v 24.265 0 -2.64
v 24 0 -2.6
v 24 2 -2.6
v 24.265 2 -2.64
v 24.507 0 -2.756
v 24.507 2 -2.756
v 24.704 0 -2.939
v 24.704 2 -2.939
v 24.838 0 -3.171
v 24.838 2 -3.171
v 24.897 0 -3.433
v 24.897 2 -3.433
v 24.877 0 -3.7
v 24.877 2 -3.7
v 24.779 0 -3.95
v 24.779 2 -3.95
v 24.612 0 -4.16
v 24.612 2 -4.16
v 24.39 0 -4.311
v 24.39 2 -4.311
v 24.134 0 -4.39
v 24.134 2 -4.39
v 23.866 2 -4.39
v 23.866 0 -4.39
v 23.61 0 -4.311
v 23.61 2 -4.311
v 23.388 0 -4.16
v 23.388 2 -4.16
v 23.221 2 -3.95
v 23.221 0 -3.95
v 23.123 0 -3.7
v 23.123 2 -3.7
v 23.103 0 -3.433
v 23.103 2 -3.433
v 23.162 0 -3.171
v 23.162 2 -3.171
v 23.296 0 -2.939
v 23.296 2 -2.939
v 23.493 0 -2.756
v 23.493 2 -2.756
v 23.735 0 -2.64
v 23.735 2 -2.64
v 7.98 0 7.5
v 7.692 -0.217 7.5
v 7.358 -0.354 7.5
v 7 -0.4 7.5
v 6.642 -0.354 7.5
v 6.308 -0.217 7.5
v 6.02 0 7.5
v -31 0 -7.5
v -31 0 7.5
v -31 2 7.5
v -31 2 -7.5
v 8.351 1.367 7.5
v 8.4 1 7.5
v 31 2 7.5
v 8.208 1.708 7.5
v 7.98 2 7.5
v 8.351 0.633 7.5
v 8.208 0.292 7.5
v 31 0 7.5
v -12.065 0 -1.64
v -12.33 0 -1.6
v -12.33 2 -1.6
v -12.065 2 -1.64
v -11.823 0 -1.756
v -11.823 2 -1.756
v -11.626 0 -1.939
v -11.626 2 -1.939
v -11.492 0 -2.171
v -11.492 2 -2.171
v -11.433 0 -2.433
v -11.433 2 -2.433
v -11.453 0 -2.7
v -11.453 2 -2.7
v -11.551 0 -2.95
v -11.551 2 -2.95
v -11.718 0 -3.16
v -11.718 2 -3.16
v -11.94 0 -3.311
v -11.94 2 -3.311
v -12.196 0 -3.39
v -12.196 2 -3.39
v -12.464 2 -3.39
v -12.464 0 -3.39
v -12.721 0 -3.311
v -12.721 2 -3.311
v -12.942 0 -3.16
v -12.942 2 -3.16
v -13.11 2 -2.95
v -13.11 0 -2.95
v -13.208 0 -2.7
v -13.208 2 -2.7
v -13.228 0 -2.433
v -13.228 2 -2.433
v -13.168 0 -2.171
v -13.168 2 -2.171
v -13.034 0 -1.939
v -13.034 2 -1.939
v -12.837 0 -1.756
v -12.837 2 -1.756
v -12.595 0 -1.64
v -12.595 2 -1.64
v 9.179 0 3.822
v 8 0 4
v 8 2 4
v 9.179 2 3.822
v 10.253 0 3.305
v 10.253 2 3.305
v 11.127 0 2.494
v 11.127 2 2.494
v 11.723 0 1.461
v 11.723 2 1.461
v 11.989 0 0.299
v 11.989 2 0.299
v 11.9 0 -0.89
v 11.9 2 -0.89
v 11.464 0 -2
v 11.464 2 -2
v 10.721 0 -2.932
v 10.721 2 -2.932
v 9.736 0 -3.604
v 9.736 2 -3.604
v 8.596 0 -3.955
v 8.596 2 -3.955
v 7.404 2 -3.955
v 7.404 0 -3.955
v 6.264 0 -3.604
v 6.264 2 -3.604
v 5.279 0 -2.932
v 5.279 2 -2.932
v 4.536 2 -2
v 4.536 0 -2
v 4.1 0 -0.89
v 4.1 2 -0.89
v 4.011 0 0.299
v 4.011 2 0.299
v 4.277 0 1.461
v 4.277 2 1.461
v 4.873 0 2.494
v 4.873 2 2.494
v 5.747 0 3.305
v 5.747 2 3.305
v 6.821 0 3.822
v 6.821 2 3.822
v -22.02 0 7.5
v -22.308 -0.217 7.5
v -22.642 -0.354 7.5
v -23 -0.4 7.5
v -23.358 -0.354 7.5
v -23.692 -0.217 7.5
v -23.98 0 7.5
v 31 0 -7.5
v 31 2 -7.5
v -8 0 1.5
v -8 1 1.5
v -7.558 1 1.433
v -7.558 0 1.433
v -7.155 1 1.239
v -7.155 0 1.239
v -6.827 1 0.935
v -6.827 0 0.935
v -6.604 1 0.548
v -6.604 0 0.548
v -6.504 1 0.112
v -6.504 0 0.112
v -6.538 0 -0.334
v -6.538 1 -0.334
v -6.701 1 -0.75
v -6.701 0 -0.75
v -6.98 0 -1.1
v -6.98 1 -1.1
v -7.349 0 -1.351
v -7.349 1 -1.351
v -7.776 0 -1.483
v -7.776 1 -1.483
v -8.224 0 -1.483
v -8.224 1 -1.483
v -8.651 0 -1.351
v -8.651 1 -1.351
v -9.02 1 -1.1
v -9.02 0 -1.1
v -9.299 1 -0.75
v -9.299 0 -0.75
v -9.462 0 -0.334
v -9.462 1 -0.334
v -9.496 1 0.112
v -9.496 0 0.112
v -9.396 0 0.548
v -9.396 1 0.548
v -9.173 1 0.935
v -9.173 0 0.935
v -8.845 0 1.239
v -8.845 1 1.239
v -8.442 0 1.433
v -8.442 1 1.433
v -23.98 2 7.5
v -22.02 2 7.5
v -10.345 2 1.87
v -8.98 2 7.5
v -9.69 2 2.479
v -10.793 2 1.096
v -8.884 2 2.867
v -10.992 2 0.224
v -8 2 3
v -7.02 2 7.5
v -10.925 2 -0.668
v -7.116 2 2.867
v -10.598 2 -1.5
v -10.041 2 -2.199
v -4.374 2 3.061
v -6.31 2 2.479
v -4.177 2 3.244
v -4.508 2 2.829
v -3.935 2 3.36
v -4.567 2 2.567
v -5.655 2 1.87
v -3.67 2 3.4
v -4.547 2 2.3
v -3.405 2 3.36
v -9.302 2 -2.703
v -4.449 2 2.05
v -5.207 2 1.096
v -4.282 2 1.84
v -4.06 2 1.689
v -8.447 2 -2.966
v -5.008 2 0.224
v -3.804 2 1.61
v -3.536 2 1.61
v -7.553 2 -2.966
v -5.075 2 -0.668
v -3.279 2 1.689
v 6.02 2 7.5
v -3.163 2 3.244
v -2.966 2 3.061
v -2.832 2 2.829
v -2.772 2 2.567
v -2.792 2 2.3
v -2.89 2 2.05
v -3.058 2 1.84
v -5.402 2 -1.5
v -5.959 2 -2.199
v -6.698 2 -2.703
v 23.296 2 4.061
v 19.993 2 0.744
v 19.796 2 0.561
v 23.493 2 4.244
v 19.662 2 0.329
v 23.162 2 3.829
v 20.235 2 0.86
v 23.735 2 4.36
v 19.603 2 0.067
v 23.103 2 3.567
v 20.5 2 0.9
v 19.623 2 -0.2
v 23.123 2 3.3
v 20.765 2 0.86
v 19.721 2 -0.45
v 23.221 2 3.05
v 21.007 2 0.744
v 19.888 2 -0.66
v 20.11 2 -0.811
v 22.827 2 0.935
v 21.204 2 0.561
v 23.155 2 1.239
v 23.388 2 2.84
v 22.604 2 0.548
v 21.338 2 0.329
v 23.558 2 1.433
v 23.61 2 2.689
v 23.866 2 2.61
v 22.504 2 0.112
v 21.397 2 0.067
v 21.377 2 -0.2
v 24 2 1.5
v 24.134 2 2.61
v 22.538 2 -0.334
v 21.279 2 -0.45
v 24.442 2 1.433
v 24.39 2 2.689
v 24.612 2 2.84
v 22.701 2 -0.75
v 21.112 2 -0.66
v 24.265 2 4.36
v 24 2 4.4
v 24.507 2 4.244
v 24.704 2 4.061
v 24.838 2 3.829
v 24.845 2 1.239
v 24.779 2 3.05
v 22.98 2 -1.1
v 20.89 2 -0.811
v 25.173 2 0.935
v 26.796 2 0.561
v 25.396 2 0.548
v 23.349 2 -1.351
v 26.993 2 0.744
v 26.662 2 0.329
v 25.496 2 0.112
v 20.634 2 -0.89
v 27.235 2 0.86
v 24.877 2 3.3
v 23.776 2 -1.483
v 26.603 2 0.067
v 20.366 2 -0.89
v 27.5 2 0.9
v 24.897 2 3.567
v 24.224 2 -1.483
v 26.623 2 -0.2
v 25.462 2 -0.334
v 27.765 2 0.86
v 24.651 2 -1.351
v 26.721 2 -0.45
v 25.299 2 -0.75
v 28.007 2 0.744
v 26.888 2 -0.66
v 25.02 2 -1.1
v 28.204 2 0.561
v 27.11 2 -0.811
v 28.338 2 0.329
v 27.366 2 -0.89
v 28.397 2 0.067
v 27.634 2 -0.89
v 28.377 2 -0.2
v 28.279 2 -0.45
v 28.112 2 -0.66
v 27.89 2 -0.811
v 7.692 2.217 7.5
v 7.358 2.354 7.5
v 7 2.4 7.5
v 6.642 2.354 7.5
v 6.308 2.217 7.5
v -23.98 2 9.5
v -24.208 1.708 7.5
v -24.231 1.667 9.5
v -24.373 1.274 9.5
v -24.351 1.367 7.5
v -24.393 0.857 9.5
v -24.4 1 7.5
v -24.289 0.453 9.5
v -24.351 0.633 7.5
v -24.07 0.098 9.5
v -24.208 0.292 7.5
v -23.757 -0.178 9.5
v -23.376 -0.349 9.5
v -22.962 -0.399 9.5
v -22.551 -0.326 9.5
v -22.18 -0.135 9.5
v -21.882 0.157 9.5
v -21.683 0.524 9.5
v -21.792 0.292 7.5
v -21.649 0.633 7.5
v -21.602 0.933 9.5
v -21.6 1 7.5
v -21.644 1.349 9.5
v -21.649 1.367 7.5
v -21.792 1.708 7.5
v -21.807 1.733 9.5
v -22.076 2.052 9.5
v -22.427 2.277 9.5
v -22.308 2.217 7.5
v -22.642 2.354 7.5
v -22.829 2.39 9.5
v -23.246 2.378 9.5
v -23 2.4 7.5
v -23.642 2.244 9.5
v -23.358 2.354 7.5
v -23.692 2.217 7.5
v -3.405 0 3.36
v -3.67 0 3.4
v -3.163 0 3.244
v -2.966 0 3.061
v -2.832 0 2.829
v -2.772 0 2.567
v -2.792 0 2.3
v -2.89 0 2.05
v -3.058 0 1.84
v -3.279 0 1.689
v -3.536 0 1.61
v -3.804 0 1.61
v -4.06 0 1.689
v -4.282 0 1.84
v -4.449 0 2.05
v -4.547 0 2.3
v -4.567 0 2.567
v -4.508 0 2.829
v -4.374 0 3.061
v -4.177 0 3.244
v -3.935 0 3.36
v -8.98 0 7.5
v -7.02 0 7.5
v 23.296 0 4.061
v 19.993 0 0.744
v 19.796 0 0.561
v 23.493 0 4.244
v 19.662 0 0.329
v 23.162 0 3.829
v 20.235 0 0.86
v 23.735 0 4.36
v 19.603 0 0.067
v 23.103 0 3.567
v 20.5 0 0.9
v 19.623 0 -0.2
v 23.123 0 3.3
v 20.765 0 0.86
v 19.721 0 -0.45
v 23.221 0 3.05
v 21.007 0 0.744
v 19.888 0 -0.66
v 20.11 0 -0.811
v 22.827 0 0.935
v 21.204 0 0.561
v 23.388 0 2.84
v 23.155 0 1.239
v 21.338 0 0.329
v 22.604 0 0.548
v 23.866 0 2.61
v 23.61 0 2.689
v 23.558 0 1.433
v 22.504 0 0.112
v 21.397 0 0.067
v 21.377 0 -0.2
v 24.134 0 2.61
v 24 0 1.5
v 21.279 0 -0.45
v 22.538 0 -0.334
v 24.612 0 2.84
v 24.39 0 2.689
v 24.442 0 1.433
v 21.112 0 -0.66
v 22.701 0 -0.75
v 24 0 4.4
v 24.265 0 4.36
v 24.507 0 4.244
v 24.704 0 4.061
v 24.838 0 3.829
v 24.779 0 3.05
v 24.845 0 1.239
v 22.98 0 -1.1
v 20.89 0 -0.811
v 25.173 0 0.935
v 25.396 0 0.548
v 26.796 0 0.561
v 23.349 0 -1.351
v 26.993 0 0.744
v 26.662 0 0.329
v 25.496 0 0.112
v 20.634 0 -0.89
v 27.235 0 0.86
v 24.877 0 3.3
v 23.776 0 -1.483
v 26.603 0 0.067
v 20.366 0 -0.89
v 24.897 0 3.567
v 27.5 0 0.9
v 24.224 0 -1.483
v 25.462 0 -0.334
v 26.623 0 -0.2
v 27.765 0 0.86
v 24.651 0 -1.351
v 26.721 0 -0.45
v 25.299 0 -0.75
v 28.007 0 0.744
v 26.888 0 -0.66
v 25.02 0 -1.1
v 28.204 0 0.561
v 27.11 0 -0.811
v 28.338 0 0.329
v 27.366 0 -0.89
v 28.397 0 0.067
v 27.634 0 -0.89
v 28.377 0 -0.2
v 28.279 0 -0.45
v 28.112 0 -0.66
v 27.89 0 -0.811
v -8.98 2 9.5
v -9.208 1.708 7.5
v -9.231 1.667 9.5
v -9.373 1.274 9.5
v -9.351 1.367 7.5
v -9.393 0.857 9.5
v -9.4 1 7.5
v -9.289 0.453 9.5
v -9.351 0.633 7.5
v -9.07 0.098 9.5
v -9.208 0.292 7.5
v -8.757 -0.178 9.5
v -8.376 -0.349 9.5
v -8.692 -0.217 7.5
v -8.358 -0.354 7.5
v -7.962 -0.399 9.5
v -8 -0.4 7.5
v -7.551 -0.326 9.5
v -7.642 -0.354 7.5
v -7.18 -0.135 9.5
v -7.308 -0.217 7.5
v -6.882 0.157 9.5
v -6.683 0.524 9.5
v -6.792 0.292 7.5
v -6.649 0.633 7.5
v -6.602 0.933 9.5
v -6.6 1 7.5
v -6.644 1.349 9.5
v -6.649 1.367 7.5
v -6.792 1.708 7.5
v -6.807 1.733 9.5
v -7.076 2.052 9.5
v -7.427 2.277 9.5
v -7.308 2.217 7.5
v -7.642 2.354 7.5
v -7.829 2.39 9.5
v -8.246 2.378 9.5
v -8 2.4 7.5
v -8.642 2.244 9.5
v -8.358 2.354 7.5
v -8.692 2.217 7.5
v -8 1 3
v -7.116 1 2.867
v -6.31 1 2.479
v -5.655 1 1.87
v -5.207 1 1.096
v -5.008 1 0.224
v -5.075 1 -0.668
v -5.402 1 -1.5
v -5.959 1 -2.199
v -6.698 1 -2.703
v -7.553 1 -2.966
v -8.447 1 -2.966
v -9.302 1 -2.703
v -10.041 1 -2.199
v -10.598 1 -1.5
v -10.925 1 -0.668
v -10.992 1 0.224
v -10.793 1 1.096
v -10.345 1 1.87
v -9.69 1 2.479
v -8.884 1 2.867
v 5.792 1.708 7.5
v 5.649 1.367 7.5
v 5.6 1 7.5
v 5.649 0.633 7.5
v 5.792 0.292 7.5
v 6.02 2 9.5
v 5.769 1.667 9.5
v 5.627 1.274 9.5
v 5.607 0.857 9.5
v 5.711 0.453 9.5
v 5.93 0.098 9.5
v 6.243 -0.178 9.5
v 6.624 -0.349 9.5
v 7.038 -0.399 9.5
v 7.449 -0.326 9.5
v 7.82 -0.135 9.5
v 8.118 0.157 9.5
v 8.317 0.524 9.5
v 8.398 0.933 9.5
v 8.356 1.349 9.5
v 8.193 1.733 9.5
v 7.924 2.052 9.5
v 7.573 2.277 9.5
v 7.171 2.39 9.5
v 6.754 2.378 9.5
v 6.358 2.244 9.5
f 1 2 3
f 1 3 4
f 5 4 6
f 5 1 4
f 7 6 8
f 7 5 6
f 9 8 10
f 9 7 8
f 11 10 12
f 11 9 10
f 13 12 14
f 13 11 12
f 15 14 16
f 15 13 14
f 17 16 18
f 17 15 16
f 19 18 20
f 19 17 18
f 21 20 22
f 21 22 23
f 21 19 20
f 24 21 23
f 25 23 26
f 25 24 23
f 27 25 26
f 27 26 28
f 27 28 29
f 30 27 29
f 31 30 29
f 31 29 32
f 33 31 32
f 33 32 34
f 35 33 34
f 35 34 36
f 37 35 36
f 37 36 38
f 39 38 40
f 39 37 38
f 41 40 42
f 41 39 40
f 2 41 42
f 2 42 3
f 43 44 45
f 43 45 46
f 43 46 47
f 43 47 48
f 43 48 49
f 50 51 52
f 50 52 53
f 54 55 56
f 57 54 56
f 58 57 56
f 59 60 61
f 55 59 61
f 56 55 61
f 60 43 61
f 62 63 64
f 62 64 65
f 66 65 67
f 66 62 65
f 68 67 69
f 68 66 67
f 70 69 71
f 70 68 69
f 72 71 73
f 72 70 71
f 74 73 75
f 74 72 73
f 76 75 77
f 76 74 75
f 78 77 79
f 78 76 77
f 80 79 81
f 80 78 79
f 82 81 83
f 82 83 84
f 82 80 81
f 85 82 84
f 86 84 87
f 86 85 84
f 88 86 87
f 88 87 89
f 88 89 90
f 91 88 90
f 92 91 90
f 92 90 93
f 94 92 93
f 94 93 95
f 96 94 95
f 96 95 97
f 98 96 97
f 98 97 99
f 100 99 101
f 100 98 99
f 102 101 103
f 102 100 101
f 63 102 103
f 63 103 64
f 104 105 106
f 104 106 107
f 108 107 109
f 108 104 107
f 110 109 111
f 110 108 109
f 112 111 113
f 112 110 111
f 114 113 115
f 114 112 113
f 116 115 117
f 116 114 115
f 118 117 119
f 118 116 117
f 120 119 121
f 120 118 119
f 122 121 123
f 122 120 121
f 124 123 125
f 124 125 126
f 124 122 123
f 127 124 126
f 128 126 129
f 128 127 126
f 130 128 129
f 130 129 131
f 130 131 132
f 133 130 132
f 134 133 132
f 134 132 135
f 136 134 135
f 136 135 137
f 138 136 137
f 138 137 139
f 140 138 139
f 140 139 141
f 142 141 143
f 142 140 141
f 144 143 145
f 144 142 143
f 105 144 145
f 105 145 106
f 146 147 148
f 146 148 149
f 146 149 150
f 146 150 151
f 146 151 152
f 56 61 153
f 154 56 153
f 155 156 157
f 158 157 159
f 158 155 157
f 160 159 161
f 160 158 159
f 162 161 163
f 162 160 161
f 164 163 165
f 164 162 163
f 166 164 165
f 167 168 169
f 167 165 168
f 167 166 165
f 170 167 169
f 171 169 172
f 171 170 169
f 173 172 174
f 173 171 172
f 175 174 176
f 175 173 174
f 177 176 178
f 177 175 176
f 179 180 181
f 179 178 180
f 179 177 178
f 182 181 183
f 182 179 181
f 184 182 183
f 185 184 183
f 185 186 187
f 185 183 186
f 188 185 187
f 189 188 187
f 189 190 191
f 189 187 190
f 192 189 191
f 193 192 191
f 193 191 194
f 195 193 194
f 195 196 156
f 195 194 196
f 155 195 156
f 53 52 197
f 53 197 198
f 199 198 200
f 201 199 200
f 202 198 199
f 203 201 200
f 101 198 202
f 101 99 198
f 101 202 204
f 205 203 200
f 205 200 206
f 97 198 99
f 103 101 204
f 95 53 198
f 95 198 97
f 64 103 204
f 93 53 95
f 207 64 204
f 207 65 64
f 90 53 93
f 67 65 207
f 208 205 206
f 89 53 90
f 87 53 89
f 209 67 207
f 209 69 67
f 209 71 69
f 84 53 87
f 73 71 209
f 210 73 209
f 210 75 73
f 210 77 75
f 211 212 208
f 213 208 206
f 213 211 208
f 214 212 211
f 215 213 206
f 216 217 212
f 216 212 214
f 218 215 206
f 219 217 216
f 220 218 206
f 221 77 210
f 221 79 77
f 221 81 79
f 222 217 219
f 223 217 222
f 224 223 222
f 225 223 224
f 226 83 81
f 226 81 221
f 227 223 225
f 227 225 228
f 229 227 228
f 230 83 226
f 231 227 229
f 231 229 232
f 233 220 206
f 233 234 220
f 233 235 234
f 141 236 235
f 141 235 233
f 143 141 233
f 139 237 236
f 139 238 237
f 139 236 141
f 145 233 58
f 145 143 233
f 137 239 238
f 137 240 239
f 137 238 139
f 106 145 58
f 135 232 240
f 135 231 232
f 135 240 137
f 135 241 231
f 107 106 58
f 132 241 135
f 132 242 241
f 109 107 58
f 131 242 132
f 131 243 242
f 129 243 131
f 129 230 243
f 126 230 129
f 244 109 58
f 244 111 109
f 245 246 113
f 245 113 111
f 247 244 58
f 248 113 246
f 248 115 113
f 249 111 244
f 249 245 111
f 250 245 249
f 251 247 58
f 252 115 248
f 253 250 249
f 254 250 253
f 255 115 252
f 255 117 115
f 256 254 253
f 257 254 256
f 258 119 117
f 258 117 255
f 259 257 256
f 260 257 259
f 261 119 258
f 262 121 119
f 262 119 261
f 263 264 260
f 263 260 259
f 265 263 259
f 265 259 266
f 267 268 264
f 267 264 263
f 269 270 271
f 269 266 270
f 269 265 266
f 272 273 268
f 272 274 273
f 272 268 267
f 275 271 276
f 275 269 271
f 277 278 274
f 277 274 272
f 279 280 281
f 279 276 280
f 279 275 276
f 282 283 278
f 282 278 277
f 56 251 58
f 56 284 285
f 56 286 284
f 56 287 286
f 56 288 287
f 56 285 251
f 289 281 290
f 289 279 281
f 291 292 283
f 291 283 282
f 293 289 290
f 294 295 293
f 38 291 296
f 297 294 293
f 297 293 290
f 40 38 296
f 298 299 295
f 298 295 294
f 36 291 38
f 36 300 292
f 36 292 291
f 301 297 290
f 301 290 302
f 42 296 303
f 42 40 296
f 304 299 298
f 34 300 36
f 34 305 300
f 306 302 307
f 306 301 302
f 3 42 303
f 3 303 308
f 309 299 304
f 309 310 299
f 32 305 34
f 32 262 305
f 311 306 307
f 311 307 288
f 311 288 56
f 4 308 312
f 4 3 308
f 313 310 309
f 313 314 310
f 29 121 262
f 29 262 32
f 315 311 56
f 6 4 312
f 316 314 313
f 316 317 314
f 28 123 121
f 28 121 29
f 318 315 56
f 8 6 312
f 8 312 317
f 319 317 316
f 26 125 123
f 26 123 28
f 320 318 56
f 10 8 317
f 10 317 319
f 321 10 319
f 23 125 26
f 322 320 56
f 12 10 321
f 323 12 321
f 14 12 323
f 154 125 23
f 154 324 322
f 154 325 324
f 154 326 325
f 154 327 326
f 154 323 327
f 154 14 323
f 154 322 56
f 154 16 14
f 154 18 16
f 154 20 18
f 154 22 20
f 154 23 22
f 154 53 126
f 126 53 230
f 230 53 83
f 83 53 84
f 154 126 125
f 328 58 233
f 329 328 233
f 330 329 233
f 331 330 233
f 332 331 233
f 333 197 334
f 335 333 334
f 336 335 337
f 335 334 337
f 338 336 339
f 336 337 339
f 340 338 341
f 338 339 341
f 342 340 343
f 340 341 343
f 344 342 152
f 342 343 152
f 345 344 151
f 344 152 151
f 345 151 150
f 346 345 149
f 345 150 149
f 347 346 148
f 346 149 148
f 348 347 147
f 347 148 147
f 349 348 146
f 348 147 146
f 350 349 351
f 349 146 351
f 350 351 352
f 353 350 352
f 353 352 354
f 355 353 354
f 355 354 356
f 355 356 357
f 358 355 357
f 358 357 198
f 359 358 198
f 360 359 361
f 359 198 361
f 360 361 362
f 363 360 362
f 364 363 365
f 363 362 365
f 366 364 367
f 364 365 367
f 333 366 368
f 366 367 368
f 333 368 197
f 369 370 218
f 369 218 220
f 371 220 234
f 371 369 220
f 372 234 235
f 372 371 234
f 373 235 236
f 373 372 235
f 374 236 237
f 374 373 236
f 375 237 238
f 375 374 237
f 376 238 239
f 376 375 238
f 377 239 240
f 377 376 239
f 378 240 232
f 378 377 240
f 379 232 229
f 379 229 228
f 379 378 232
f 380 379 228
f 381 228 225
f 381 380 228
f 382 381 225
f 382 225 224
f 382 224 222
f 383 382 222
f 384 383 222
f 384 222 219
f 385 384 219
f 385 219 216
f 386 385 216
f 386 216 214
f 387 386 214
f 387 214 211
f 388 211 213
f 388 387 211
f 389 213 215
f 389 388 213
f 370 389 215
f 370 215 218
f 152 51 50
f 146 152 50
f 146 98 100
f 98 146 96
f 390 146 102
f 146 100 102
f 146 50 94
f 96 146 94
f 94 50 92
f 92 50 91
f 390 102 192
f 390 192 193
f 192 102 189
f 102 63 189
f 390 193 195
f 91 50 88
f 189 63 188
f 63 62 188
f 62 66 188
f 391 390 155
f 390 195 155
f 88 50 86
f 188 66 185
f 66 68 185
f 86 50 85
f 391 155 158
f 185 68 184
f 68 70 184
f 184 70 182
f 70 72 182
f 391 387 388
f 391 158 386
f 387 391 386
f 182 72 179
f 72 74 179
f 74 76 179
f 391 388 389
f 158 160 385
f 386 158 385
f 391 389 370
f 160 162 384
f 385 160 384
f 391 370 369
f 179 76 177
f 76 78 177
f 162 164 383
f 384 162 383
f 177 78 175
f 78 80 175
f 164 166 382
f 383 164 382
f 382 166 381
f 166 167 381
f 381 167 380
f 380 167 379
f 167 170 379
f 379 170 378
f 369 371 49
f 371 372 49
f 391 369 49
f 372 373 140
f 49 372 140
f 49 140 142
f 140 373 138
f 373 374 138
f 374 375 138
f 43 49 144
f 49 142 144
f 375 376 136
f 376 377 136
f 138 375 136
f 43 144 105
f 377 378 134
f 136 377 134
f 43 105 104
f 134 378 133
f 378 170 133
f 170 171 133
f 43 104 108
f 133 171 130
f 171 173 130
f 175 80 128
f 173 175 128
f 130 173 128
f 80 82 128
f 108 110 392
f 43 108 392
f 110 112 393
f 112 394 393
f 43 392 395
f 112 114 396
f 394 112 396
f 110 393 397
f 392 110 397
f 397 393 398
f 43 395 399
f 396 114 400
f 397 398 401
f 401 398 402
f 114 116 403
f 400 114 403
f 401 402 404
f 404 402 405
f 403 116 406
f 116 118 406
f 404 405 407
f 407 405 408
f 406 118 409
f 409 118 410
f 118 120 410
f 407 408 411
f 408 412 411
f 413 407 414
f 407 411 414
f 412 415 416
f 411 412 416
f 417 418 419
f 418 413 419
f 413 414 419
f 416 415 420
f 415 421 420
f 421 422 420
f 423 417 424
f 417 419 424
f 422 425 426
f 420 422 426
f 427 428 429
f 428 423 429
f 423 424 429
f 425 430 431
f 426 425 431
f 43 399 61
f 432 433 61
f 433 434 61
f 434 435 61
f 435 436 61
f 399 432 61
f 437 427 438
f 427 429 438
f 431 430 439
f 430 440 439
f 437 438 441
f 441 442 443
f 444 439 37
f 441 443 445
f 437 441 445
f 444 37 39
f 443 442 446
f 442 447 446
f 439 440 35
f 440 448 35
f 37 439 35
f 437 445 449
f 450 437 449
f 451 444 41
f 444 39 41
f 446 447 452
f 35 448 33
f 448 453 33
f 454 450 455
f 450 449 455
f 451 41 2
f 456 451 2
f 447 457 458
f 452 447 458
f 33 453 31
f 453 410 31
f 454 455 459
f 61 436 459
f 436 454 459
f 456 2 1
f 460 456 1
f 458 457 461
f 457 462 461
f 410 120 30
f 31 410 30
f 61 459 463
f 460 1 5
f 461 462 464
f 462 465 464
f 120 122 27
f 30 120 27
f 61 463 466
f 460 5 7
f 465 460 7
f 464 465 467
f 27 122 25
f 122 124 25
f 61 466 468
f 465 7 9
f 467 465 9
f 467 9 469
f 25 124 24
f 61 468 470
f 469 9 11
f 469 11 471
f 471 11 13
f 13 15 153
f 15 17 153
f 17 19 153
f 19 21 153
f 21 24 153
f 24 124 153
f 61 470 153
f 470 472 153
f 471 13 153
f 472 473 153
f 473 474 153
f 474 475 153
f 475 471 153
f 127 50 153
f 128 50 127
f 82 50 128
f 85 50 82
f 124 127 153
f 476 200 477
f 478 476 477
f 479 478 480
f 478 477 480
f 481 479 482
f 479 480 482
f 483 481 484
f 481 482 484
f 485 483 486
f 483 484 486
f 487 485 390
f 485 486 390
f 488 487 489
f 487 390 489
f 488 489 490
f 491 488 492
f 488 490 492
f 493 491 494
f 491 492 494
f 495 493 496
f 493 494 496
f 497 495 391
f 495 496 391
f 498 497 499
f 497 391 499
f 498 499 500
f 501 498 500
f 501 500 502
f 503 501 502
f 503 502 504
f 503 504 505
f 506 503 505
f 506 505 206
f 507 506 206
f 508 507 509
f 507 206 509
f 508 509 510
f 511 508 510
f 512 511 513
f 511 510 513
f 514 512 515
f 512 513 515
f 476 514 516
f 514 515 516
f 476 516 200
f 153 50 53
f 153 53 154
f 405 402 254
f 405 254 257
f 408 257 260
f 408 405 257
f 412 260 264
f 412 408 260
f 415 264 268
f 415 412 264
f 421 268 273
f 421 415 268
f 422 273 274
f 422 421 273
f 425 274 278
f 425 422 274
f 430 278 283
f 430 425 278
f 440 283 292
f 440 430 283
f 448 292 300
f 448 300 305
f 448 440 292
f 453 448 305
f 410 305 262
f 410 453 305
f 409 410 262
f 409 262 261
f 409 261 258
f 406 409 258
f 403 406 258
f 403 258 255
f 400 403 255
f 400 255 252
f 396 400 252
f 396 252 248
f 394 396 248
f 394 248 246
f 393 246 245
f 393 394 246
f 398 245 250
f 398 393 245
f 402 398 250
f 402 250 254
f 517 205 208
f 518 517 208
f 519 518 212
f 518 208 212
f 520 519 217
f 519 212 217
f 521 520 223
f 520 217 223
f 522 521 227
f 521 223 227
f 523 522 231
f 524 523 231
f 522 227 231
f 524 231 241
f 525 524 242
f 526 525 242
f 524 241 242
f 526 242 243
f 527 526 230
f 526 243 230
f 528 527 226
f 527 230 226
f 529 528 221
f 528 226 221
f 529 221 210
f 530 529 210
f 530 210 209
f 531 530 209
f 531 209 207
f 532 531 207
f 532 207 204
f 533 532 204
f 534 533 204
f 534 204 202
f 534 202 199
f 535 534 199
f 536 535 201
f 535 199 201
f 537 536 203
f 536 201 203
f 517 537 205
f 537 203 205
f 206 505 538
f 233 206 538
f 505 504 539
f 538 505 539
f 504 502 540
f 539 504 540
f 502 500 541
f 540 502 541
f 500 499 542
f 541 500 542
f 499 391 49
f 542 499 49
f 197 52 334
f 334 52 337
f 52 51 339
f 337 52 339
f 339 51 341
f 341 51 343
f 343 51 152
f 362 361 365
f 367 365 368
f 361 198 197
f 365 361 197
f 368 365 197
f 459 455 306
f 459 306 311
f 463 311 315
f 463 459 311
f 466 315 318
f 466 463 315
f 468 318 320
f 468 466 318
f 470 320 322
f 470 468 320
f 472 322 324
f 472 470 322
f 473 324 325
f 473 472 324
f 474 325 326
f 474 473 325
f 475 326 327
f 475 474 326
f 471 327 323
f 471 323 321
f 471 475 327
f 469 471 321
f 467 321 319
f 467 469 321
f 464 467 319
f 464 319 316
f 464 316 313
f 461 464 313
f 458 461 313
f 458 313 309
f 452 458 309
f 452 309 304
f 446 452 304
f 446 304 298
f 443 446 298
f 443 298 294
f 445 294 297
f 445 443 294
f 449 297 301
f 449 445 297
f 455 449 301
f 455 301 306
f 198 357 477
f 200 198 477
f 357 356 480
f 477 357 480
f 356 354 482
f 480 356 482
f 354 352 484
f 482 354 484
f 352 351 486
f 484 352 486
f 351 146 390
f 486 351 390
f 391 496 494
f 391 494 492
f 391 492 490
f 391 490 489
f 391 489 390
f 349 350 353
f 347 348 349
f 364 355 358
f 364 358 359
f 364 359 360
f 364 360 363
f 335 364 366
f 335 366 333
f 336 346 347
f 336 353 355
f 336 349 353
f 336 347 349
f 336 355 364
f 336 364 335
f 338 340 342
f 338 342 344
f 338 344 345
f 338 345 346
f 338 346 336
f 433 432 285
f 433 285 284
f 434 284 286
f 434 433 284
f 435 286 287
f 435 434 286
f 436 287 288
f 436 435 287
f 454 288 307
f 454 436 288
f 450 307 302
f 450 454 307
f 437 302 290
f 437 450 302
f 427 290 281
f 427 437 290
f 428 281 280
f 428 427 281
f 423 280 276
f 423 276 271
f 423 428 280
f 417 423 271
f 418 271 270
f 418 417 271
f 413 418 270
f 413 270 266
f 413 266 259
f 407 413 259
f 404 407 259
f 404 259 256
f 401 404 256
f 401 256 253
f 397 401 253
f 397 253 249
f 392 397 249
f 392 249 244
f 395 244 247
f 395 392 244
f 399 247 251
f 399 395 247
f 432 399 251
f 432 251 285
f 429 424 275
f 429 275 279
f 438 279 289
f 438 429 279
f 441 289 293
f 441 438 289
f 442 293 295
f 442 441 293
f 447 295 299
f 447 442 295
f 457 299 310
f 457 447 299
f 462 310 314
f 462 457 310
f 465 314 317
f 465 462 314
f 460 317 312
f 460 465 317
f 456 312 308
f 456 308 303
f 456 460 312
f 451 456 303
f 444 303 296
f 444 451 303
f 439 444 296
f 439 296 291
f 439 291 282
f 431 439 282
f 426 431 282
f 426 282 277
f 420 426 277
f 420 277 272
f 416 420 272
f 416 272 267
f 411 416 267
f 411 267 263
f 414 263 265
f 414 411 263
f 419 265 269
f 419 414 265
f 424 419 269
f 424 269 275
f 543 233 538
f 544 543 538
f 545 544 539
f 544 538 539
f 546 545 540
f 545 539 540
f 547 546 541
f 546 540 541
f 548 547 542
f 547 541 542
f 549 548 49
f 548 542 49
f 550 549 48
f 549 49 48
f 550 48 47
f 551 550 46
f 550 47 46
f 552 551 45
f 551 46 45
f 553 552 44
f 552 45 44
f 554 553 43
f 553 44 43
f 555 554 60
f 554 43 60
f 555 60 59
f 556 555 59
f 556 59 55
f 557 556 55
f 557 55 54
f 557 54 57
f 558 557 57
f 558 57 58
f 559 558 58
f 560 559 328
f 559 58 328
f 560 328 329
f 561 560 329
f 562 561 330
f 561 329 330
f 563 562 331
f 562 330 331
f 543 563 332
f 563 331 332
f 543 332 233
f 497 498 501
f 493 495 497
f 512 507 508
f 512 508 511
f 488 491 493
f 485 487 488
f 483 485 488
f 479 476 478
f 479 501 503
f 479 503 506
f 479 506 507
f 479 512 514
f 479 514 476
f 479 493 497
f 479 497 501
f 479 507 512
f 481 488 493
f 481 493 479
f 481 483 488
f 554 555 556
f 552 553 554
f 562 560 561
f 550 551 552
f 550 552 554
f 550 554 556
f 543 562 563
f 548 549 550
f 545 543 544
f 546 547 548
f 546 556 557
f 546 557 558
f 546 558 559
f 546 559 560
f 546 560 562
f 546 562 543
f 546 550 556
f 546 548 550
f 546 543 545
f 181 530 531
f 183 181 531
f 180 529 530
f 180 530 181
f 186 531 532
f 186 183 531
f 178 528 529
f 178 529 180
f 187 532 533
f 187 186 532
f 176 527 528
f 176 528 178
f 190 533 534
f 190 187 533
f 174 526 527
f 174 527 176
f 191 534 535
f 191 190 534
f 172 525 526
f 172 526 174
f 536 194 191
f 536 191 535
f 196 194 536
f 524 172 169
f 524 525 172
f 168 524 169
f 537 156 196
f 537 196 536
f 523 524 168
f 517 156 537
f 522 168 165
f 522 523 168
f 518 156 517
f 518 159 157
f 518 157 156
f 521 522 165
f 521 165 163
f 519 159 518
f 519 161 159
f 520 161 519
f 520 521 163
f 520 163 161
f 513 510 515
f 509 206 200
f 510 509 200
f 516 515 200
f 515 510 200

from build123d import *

# Parameters (mm, degrees)
SKETCH_1_W          = 62
SKETCH_1_H          = 15
SKETCH_1_R          = 0.9
SKETCH_1_R_2        = 1.5
SKETCH_1_R_3        = 4
EXTRUDE_1_DEPTH     = 2
SKETCH_2_R          = 1.4
EXTRUDE_2_DEPTH     = 2
SKETCH_4_R          = 3
CUT_EXTRUDE_1_DEPTH = 1


with BuildPart() as part:
    # 草图1 → 凸台-拉伸1 (new body)
    # profile 1 of 3: a face of its own
    with BuildSketch(Plane(origin=(0, 0, 0), x_dir=(1, 0, 0), z_dir=(0, 1, 0))):
        Rectangle(SKETCH_1_W, SKETCH_1_H)
        with Locations(Location((-12.330127019, 2.5, 0), (0, 0, 270))):
            Circle(SKETCH_1_R, mode=Mode.SUBTRACT)
        with Locations(Location((24, 3.5, 0), (0, 0, 270))):
            Circle(SKETCH_1_R, mode=Mode.SUBTRACT)
        with Locations(Location((20.5, 0, 0), (0, 0, 270))):
            Circle(SKETCH_1_R, mode=Mode.SUBTRACT)
        with Locations(Location((24, -3.5, 0), (0, 0, 270))):
            Circle(SKETCH_1_R, mode=Mode.SUBTRACT)
        with Locations(Location((27.5, 0, 0), (0, 0, 270))):
            Circle(SKETCH_1_R, mode=Mode.SUBTRACT)
        with Locations(Location((24, 0, 0), (0, 0, 270))):
            Circle(SKETCH_1_R_2, mode=Mode.SUBTRACT)
        with Locations(Location((8, 0, 0), (0, 0, 270))):
            Circle(SKETCH_1_R_3, mode=Mode.SUBTRACT)
        with Locations((-12.330127019, -2.5)):
            Circle(SKETCH_1_R, mode=Mode.SUBTRACT)
        with Locations((-3.669872981, 2.5)):
            Circle(SKETCH_1_R, mode=Mode.SUBTRACT)
        with Locations(Location((-8, 0, 0), (0, 0, 270))):
            Circle(SKETCH_1_R_2, mode=Mode.SUBTRACT)
        with Locations(Location((-3.669872981, -2.5, 0), (0, 0, 270))):
            Circle(SKETCH_1_R, mode=Mode.SUBTRACT)
    # profile 2 of 3: a face of its own
    with BuildSketch(Plane(origin=(0, 0, 0), x_dir=(1, 0, 0), z_dir=(0, 1, 0))):
        with Locations((-12.330127019, -2.5)):
            Circle(SKETCH_1_R)
    # profile 3 of 3: a face of its own
    with BuildSketch(Plane(origin=(0, 0, 0), x_dir=(1, 0, 0), z_dir=(0, 1, 0))):
        with Locations((-3.669872981, 2.5)):
            Circle(SKETCH_1_R)
    extrude(amount=EXTRUDE_1_DEPTH)

    # 草图2 → 凸台-拉伸2 (add)
    with BuildSketch(Plane.XY.offset(7.5)):
        with Locations(Location((-23, 1, 0), (0, 0, 134.415308597))):
            Circle(SKETCH_2_R)
        with Locations(Location((-8, 1, 0), (0, 0, 134.415308597))):
            Circle(SKETCH_2_R)
        with Locations(Location((7, 1, 0), (0, 0, 134.415308597))):
            Circle(SKETCH_2_R)
    extrude(amount=EXTRUDE_2_DEPTH)

    # 草图4 → 切除-拉伸1 (cut)
    with BuildSketch(Plane(origin=(0, 2, 0), x_dir=(1, 0, 0), z_dir=(0, 1, 0))):
        with Locations(Location((-8, 0, 0), (0, 0, 270))):
            Circle(SKETCH_4_R)
    extrude(amount=-CUT_EXTRUDE_1_DEPTH, mode=Mode.SUBTRACT)


solid = part.part
